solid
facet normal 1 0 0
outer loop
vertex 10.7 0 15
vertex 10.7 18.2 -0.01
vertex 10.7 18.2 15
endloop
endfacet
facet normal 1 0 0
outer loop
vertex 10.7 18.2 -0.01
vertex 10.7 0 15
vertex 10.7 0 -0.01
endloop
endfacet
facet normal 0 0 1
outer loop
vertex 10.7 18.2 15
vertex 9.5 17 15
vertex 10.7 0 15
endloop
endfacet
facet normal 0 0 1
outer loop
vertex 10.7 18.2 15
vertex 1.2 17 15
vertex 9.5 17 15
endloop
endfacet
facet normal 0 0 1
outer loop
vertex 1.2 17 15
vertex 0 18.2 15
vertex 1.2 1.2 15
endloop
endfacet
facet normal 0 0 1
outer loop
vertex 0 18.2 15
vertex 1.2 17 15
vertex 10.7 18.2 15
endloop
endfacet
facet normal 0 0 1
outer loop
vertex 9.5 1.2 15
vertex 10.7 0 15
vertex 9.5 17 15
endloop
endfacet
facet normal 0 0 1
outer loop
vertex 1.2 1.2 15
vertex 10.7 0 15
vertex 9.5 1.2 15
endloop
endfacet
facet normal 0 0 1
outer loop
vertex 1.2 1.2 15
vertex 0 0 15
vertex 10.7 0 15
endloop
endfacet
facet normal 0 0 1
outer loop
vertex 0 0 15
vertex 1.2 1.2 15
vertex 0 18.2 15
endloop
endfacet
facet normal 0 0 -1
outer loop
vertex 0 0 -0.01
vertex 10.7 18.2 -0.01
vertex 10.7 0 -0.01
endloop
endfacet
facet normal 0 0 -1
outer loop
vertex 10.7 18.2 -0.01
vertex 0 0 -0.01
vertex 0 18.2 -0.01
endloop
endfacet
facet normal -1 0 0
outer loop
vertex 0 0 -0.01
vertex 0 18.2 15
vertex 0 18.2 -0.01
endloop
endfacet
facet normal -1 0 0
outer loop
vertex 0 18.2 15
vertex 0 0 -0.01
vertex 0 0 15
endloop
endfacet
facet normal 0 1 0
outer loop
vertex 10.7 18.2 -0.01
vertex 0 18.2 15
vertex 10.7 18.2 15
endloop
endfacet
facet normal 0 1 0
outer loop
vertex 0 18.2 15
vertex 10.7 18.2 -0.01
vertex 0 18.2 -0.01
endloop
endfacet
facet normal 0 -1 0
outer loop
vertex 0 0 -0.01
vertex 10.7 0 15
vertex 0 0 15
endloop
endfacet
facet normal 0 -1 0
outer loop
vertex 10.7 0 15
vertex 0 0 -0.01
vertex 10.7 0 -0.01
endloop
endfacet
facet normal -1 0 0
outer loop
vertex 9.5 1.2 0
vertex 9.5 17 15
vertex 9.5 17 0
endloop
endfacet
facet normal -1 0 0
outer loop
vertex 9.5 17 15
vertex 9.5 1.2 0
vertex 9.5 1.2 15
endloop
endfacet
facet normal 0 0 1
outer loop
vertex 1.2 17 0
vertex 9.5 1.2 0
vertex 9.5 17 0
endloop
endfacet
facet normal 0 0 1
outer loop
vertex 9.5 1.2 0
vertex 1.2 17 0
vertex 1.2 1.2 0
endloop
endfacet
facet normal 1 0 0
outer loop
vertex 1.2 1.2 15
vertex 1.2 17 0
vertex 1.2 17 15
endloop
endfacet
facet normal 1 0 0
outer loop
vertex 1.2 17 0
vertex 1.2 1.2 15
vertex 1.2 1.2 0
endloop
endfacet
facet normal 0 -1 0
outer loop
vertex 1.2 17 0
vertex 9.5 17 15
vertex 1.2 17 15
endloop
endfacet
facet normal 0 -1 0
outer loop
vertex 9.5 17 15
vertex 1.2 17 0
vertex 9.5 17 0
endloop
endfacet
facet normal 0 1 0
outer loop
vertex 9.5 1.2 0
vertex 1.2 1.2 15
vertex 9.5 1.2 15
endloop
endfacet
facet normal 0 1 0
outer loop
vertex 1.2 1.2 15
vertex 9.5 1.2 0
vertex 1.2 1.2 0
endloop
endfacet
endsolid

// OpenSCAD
// file: ../Base/Rotation.scad
// Fischertechnik Box Foundation
// Geometry Helpers Rotation

include <PlacementOptions.scad>

// getRotatedSpace(space, rotation=NoRotation)
// Rotates the space dependent on the specified rotation

function getRotatedSpace(space, rotation=NoRotation) = [
    (rotation == Rotate90 || rotation == Rotate270) ? space.y : space.x,
    (rotation == Rotate90 || rotation == Rotate270) ? space.x : space.y
];

// Rotates the given space around the fixed left lower corner
// space = the space the children needs as width/depth list [width,depth]
// rotation = 0 Rotate0 degrees, 1 Rotate90 degrees, 2 Rotate180 degrees, 3 Rotate270 degrees (equivalent to -90)

module RotateFix(space, rotation=NoRotation) {
    dy = (rotation == Rotate0 || rotation == Rotate270) ? 0 :
        (rotation == Rotate90) ? space.x :
        space.y;
    dx = (rotation < Rotate180) ? 0 :
        (rotation == Rotate180) ? space.x :
        space.y;
    
    translate([dx, dy, 0])
        rotate([0, 0, rotations[rotation]])
            children();
}
// file: ../Base/Alignment.scad
// Fischertechnik Box Foundation
// Geometry Helpers Alignment

include <PlacementOptions.scad>

// getAlignedX(elementWidth, spaceWidth, align=AlignRight, offset=0)
// Gets the aligned X offset of an element with the given
// width in the given space.
// elementWidth = The width of the element to positon
// spaceWidth = The space where the element should be aligned
// align = 0 AlignLeft, 1 AlignCenter, 2 AlignRight
// offset = an optional offset from the aligned position. When
// aligned left or centered, then positive values are in X direction.
// When aligned right then positive values are in negative X direction.

function getAlignedX(elementWidth, spaceWidth, align=AlignRight, offset=0) =
    (align == AlignLeft) ?
        offset :
        ((align == AlignCenter) ?
        (spaceWidth - elementWidth)/2 + offset :
        spaceWidth - offset - elementWidth);

// getAlignedY(elementDepth, spaceDepth, align=AlignTop, offset=0)
// Gets the aligned Y offset of an element with the given
// depth in the given space.
// elementDepth = The depth of the element to positon
// spaceDepth = The space where the element should be aligned
// align = 0 AlignBottom, 1 AlignCenter, 2 AlignTop
// offset = an optional offset from the aligned position. When
// aligned bottom or centered, then positive values are in Y direction.
// When aligned top then positive values are in negative Y direction.

function getAlignedY(elementDepth, spaceDepth, align=AlignTop, offset=0) =
    (align == AlignBottom) ?
        offset :
        ((align == AlignCenter) ?
        (spaceDepth - elementDepth)/2 + offset :
        spaceDepth - offset - elementDepth);
// file: ../Base/PlacementOptions.scad
// Fischertechnik Box Foundation
// Placement Options

// Alignment
NoAlign = 0;
AlignLeft = 1;
AlignBottom = 2;
AlignCenter = 3;
AlignRight = 4;
AlignTop = 5;

// Element rotation degree steps
rotations = [0, -90, -180, -270];

// Rotation
NoRotation = 0;
Rotate0 = 0;
Rotate90 = 1;
Rotate180 = 2;
Rotate270 = 3;

// Docking (seen from above)
NoDock = -1;
DockLeft = 0;
DockTop = 1;
DockRight = 2;
DockCorner = 2;
DockBottom = 3;

// Web corners
LowerLeft = 0;
UpperLeft = 1;
UpperRight = 2;
LowerRight = 3;

// Web position relative to corner
LeftOfCorner = 0;
RightOfCorner = 1;

// Rails direction
Horizontal = true;
Vertical = false;
// file: ../Base/Boxes.scad
// Fischertechnik Box Foundation
// Pre-designed Boxes

use <Constants.scad>

include <PlacementOptions.scad>

box190Width = 190;
box190Depth = 130;
box130Width = 130;
box130Depth = 95;

// Values are from an original ec3 box
topBottomDifference = 1.5;
outerHeight = 40;
baseThickness = 1.8;
innerHeight = outerHeight - baseThickness;
stackExcess = 5.7;
radius = 3.5;
wallThickness = 1.5;
tolerance = 0.2;

boxWallThickness = wallThickness;
boxBaseThickness = baseThickness;
boxWebWidth = 3.0;

// getBoxWallThickness()
// Gets the wall thickness of a Fischertechnik Box
function getBoxWallThickness() = boxWallThickness;

// getBoxUsageHeight(height = 38.2)
// Gets the usable height of a Fischertechnik box
// height = Outer height of the box from the bottom to the upper edge.
function getBoxUsageHeight(height = outerHeight) = height - baseThickness - stackExcess;

// getBoxInnerHeight()
// Gets the inner height of a Fischertechnik box, including the stack excess
function getBoxInnerHeight() = innerHeight;

// getBoxBaseThickness()
// Gets the thickness of the Fischertechnik box base.
function getBoxBaseThickness() = boxBaseThickness;

// getBoxWebWidth()
// Gets the width of a box web
function getBoxWebWidth() = boxWebWidth;

// getBox190Space()
// Gets the usable inner space of a Box 190 as an x/y-list
function getBox190Space() = [
    box190Width - 2*getBoxWallThickness() - topBottomDifference, 
    box190Depth - 2*getBoxWallThickness() - topBottomDifference ];

// RoundedCornerPlate(width, depth, height, radius)
// Creates a body plate with rounded corners for a box. Used
// also to create the complete box with the hull module.
// width = Width of the plate
// depth = depth of the plate 
// height = thickness of the plate
// radius = radius of the rounded corner
module RoundedCornerPlate(width, depth, height, radius) {
    translate([radius, radius])
    hull() {
        w = width-2*radius;
        d = depth-2*radius;
        cube([w, d, height]);
        cylinder(height, r=radius, $fn=getFragments());
        translate([w, 0])
            cylinder(height, r=radius, $fn=getFragments());
        translate([w, d])
            cylinder(height, r=radius, $fn=getFragments());
        translate([0, d])
            cylinder(height, r=radius, $fn=getFragments());
    }
}

// BoxBase(width, depth)
// Creates an empty stackable Fischertechnik compatible box
// width = Outer width of the box (190, 130, ...)
// depth = Outer depth of the box (130, 95, ...)

module BoxBase(width, depth, height=outerHeight) {    
    thinPlate = 0.01;

    innerHeight = height - baseThickness;    
    
    module Body(tolerance=tolerance) {
        hull() {
            // Bottom with tolerance to fit into the original boxes when stacked
            translate([-wallThickness+tolerance, -wallThickness+tolerance, -baseThickness])
                RoundedCornerPlate(width-topBottomDifference-2*tolerance, depth-topBottomDifference-2*tolerance, thinPlate, radius);
            
            // Top
            translate([-wallThickness-topBottomDifference/2, -wallThickness-topBottomDifference/2, innerHeight-thinPlate])
                RoundedCornerPlate(width, depth, thinPlate, radius);
         }
    }

    module Cutoff() {
        hull() {
            coWidth = width - 2*wallThickness;
            coDepth = depth - 2*wallThickness;
            
            // Bottom
            RoundedCornerPlate(coWidth-topBottomDifference, coDepth-topBottomDifference, thinPlate, radius);

            // Top
            translate([-topBottomDifference/2, -topBottomDifference/2, innerHeight+thinPlate]) 
                RoundedCornerPlate(coWidth, coDepth, thinPlate, radius);
        }
    }
    
    difference() {        
        Body();
        Cutoff();
        stackOffset = innerHeight - stackExcess;
        translate([0, 0, stackOffset + baseThickness])
            Body(tolerance=0);
    }
}

// Creates the Fischertechnik empty box 130x190 mm and places it at position 0,0
// 190x130 are the outer sizes, the inner space is slightly smaller. Use getBox190Space() to get the inner sizes.
// The box is positioned that the usable inner space is at the 0,0,0 position.

module Box190() {
    BoxBase(box190Width, box190Depth);
}

// Gets the usable inner space of a Box 130 as an x/y-list
function getBox130Space() = [
    box130Width - 2*getBoxWallThickness() - topBottomDifference, 
    box130Depth - 2*getBoxWallThickness() - topBottomDifference ];

// Creates the Fischertechnik empty box 95x130 mm and places it at position 0,0
// 190x130 are the outer sizes, the inner space is slightly smaller. Use getBox190Space() to get the inner sizes.
// The box is positioned that the usable inner space is at the 0,0,0 position.

module Box130() {
    BoxBase(box130Width, box130Depth);
}

// Creates a web at the specified box walls
// corner 0 = LowerLeft, 1 = UpperLeft, 2 = UpperRight, 3 = LowerRight
// side 0 = LeftOfCorner, 1 = RightOfCorner
// distance = Distance in mm from the corner
// boxSpace = inner width and depth of the box (default: Box 190)
// webWidth = length of the web (default is 3 mms)
// webThickness = thickness of the web (default is 1 mm)
// height = Height of the web (standard is getBoxUsageHeight())
// sink = How much of the web is sunk into the wall

module BoxWeb(
    corner, 
    side, 
    distance, 
    boxSpace=getBox190Space(), 
    webWidth=getBoxWebWidth(), 
    webThickness=1.0, 
    height=getBoxUsageHeight(),
    sink = getBoxWallThickness()/2) {
    width = (corner % 2 == 0) ? 
            (side == LeftOfCorner ? webWidth : webThickness) :
            (side == LeftOfCorner ? webThickness : webWidth);

    depth = (corner % 2 == 0) ? 
            (side == RightOfCorner ? webWidth : webThickness) :
            (side == RightOfCorner ? webThickness : webWidth);
    
    xDiff = corner == LowerLeft ? 
                (side == LeftOfCorner ? -sink : distance) :
            (corner == UpperLeft ?                
                (side == LeftOfCorner ? distance : -sink) :
            (corner == UpperRight ?
                (side == LeftOfCorner ? boxSpace.x-webWidth+sink : boxSpace.x-distance-webThickness) :
                (side == LeftOfCorner ? boxSpace.x-distance-webThickness: boxSpace.x-webWidth+sink)));

    yDiff = corner == LowerLeft ? 
                (side == RightOfCorner ? -sink : distance) :
            (corner == UpperLeft ?
                (side == RightOfCorner ? boxSpace.y-distance-webThickness : boxSpace.y-webWidth+sink) :
            (corner == UpperRight ?
                (side == RightOfCorner ? boxSpace.y-webWidth+sink : boxSpace.y-distance-webThickness) :
                (side == RightOfCorner ? distance : -sink)));
    
    translate([xDiff, yDiff, -getExcess()])
        cube([width, depth, height + 2*getExcess()]);
}
// file: ../Base/Placement.scad
// Fischertechnik Box Foundation
// Geometry Helpers Placement

use <Constants.scad>
use <Alignment.scad>
use <Rotation.scad>
use <Boxes.scad>

include <PlacementOptions.scad>

// Place(x=0, y=0, elementSpace=[0,0], alignX=AlignLeft, alignY=AlignBottom, rotation=Rotate0, boxSpace=getBox190Space())
// Places the child at the specified position
// y = Y-Position. This is a relative position when an X aligment is specified.
// x = X-Position. This is a relative position when an Y aligment is specified.
// elementSpace = space of the element to be placed [x,y]
// alignX = -1=NoAlign, 0 AlignLeft, 1 AlignCenter, 3 AlignRight (elementSpace and boxSpace required!)
// alignY = -1=NoAlign, 2 AlignBottom, 1 AlignCenter, 4 AlignTop (elementSpace and boxSpace required!)
// rotation = 0 Rotate0 0 degrees, 1 Rotate90 90 degrees, 
// 2 Rotate180 180 degrees, 3 Rotate270 270 degrees (equivalent to -90)
// boxSpace = Inner space of the box where the placement occurs [x,y] - default is Box 190x130 inner space

module Place(x=0, y=0, elementSpace=[0,0], 
  alignX=AlignLeft, alignY=AlignBottom, 
  rotation=NoRotation, boxSpace=getBox190Space()) {

    module Position(x, y, space, rotation=Rotate0) {
        translate([x, y, 0])
            RotateFix(space, rotation)
                children();
    }

    space = getRotatedSpace(elementSpace, rotation);
    alignedX = getAlignedX(space.x, boxSpace.x, alignX, x);
    alignedY = getAlignedY(space.y, boxSpace.y, alignY, y);
    Position(alignedX, alignedY, elementSpace, rotation)
        children();
}

// Center(space=getBox130Space(), elementSpace=[0,0])
// space = Space where the children is centered. For cylinder use centered=true and no elementSpace.
// elementSpace = space of the element to be centered [x,y]

module Center(space=getBox190Space(), elementSpace=[0,0]) {
    Place(elementSpace=elementSpace, boxSpace=space, alignX=AlignCenter, alignY=AlignCenter)
        children();
}

// CenterHorizontal(width=0, y=0, offset=0, space=getBox130Space())
// width = Width of the element to be placed.
// y = Y position of the element
// offset = Offset from the center position (negative will be left of the center)
// space = Space where the element is placed

module CenterHorizontal(width=0, y=0, offset=0, space=getBox190Space()) {
    Place(x=offset, y=y, elementSpace=[width, 0], boxSpace=space, alignX=AlignCenter)
        children(0);
}

// CenterVertical(depth=0, x=0, offset=0, space=getBox130Space())
// depth = Depth of the element to be placed.
// x = X position of the element
// offset = Offset from the center position (negative will be down of the center)
// space = Space where the element is placed

module CenterVertical(depth=0, x=0, offset=0, space=getBox190Space()) {
    Place(x=x, y=offset, elementSpace=[0, depth], boxSpace=space, alignY=AlignCenter)
        children(0);
}

// getIsVertical(align)
// True if the specified alignment needs a vertical orientation for a divider (AlignRight, AlignLeft)

function getIsVertical(align) = (align == AlignRight || align == AlignLeft);

// getIsHorizontal(align)
// True if the specified alignment needs a horizontal orientation for a divider (AlignTop, AlignBottom)

function getIsHorizontal(align) = (align == AlignTop || align == AlignBottom);
// file: ../Base/Constants.scad
// Fischertechnik Box Foundation
// Constants

// Constant values necessary for multiple elements

// Base constants
dividerThickness = 1.2;
excess = 0.01;
fragments = 90;
tolerance = 0.8;

// Gets the thickness of a divider 
function getDividerThickness() = dividerThickness;

// Gets the excess that is used to merge walls into each other
function getExcess() = excess;

// Gets amount of fragments of a cylinder
function getFragments() = fragments;

// Gets the inner tolerance of a frame to each side
function getTolerance() = tolerance;


// Fischertechnik specific constants
axisDiameter = 4;
axisBottomDiameter = axisDiameter + 1;
axisTolerance = 0.2;
axisLockingLength = 8;

// Gets axis diameter of Fischertechnik axis
function getAxisDiameter() = axisDiameter;

// Gets axis diameter tolerance (subtracted for element axis)
function getAxisTolerance() = axisTolerance;

// Gets the axis diameter for standing axis
function getStandAxisDiameter() = getAxisDiameter() - getAxisTolerance();

// Gets axis bottom diameter for thicker part at the bottom
function getAxisBottomDiameter() = axisBottomDiameter;

// Gets the lengthh of the locking part of a locking axis
function getAxisLockingLength() = axisLockingLength;

pinHeight = 2.5;
pinTolerance = 0.2;

// gets the height of a connecting pin
function getPinHeight() = pinHeight;

// gets the connecting pin height tolerance
function getPinTolerance() = pinTolerance;

standardEdgeDistance = 2.5;
standardWebDistance = 11.5;
standardCornerLength = 15;

// gets the standard distance to the wall of the box for dockable frames with webs
function getStandardEdgeDistance() = standardEdgeDistance;

// gets the standard distance of each web to the corner of the dockable frame
function getStandardWebDistance() = standardWebDistance;

// gets the standard length of the corner walls of a dockable frame
function getStandardCornerLength() = standardCornerLength;

tubeWallFactor = 0.8;

// gets the wall thickness of a tube.
function getTubeWallThickness() = tubeWallFactor * getDividerThickness();

smallPartsFrameHeight = 20;

// gets the frame height for docked small parts boxes.
function getSmallPartsFrameHeight() = smallPartsFrameHeight;

hubRingDiameter = 19.5;
hubRingLevelDiameter = 21;

// gets the diameter of a tube matching the inner ring of a wheel
function getHubRingDiameter() = hubRingDiameter;

// gets the diameter of a hub tube with a thicker diameter
function getHubRingLevelDiameter() = hubRingLevelDiameter;
// main file
// Fischertechnik Box Library
// Frame for block 15x30x5 with pin
// 35049

use <../ModelBase/Simple.scad>

/* [Element Parameters] */
columns = 1;
rows = 1;

/* [Hidden] */
width = 7.5;
depth = 15;
height = 15;

// getFrameBlock15x30x5Space(columns=1, rows=1)
// Gets the space of a frame for columns x rows 15x30x5 blocks

function getFrameBlock15x30x5Space(columns=1, rows=1) = getFrameOuterVolume([width * columns, depth * rows, height]);

// FrameBlock15x30x5(columns=1, rows=1)
// frame for columns x rows small parts (7.5 or 5)

module FrameBlock15x30x5(columns=1, rows=1) {
    Frame([width * columns, depth * rows, height]);
}

// Tests
color("lightgray")
FrameBlock15x30x5(columns, rows);
